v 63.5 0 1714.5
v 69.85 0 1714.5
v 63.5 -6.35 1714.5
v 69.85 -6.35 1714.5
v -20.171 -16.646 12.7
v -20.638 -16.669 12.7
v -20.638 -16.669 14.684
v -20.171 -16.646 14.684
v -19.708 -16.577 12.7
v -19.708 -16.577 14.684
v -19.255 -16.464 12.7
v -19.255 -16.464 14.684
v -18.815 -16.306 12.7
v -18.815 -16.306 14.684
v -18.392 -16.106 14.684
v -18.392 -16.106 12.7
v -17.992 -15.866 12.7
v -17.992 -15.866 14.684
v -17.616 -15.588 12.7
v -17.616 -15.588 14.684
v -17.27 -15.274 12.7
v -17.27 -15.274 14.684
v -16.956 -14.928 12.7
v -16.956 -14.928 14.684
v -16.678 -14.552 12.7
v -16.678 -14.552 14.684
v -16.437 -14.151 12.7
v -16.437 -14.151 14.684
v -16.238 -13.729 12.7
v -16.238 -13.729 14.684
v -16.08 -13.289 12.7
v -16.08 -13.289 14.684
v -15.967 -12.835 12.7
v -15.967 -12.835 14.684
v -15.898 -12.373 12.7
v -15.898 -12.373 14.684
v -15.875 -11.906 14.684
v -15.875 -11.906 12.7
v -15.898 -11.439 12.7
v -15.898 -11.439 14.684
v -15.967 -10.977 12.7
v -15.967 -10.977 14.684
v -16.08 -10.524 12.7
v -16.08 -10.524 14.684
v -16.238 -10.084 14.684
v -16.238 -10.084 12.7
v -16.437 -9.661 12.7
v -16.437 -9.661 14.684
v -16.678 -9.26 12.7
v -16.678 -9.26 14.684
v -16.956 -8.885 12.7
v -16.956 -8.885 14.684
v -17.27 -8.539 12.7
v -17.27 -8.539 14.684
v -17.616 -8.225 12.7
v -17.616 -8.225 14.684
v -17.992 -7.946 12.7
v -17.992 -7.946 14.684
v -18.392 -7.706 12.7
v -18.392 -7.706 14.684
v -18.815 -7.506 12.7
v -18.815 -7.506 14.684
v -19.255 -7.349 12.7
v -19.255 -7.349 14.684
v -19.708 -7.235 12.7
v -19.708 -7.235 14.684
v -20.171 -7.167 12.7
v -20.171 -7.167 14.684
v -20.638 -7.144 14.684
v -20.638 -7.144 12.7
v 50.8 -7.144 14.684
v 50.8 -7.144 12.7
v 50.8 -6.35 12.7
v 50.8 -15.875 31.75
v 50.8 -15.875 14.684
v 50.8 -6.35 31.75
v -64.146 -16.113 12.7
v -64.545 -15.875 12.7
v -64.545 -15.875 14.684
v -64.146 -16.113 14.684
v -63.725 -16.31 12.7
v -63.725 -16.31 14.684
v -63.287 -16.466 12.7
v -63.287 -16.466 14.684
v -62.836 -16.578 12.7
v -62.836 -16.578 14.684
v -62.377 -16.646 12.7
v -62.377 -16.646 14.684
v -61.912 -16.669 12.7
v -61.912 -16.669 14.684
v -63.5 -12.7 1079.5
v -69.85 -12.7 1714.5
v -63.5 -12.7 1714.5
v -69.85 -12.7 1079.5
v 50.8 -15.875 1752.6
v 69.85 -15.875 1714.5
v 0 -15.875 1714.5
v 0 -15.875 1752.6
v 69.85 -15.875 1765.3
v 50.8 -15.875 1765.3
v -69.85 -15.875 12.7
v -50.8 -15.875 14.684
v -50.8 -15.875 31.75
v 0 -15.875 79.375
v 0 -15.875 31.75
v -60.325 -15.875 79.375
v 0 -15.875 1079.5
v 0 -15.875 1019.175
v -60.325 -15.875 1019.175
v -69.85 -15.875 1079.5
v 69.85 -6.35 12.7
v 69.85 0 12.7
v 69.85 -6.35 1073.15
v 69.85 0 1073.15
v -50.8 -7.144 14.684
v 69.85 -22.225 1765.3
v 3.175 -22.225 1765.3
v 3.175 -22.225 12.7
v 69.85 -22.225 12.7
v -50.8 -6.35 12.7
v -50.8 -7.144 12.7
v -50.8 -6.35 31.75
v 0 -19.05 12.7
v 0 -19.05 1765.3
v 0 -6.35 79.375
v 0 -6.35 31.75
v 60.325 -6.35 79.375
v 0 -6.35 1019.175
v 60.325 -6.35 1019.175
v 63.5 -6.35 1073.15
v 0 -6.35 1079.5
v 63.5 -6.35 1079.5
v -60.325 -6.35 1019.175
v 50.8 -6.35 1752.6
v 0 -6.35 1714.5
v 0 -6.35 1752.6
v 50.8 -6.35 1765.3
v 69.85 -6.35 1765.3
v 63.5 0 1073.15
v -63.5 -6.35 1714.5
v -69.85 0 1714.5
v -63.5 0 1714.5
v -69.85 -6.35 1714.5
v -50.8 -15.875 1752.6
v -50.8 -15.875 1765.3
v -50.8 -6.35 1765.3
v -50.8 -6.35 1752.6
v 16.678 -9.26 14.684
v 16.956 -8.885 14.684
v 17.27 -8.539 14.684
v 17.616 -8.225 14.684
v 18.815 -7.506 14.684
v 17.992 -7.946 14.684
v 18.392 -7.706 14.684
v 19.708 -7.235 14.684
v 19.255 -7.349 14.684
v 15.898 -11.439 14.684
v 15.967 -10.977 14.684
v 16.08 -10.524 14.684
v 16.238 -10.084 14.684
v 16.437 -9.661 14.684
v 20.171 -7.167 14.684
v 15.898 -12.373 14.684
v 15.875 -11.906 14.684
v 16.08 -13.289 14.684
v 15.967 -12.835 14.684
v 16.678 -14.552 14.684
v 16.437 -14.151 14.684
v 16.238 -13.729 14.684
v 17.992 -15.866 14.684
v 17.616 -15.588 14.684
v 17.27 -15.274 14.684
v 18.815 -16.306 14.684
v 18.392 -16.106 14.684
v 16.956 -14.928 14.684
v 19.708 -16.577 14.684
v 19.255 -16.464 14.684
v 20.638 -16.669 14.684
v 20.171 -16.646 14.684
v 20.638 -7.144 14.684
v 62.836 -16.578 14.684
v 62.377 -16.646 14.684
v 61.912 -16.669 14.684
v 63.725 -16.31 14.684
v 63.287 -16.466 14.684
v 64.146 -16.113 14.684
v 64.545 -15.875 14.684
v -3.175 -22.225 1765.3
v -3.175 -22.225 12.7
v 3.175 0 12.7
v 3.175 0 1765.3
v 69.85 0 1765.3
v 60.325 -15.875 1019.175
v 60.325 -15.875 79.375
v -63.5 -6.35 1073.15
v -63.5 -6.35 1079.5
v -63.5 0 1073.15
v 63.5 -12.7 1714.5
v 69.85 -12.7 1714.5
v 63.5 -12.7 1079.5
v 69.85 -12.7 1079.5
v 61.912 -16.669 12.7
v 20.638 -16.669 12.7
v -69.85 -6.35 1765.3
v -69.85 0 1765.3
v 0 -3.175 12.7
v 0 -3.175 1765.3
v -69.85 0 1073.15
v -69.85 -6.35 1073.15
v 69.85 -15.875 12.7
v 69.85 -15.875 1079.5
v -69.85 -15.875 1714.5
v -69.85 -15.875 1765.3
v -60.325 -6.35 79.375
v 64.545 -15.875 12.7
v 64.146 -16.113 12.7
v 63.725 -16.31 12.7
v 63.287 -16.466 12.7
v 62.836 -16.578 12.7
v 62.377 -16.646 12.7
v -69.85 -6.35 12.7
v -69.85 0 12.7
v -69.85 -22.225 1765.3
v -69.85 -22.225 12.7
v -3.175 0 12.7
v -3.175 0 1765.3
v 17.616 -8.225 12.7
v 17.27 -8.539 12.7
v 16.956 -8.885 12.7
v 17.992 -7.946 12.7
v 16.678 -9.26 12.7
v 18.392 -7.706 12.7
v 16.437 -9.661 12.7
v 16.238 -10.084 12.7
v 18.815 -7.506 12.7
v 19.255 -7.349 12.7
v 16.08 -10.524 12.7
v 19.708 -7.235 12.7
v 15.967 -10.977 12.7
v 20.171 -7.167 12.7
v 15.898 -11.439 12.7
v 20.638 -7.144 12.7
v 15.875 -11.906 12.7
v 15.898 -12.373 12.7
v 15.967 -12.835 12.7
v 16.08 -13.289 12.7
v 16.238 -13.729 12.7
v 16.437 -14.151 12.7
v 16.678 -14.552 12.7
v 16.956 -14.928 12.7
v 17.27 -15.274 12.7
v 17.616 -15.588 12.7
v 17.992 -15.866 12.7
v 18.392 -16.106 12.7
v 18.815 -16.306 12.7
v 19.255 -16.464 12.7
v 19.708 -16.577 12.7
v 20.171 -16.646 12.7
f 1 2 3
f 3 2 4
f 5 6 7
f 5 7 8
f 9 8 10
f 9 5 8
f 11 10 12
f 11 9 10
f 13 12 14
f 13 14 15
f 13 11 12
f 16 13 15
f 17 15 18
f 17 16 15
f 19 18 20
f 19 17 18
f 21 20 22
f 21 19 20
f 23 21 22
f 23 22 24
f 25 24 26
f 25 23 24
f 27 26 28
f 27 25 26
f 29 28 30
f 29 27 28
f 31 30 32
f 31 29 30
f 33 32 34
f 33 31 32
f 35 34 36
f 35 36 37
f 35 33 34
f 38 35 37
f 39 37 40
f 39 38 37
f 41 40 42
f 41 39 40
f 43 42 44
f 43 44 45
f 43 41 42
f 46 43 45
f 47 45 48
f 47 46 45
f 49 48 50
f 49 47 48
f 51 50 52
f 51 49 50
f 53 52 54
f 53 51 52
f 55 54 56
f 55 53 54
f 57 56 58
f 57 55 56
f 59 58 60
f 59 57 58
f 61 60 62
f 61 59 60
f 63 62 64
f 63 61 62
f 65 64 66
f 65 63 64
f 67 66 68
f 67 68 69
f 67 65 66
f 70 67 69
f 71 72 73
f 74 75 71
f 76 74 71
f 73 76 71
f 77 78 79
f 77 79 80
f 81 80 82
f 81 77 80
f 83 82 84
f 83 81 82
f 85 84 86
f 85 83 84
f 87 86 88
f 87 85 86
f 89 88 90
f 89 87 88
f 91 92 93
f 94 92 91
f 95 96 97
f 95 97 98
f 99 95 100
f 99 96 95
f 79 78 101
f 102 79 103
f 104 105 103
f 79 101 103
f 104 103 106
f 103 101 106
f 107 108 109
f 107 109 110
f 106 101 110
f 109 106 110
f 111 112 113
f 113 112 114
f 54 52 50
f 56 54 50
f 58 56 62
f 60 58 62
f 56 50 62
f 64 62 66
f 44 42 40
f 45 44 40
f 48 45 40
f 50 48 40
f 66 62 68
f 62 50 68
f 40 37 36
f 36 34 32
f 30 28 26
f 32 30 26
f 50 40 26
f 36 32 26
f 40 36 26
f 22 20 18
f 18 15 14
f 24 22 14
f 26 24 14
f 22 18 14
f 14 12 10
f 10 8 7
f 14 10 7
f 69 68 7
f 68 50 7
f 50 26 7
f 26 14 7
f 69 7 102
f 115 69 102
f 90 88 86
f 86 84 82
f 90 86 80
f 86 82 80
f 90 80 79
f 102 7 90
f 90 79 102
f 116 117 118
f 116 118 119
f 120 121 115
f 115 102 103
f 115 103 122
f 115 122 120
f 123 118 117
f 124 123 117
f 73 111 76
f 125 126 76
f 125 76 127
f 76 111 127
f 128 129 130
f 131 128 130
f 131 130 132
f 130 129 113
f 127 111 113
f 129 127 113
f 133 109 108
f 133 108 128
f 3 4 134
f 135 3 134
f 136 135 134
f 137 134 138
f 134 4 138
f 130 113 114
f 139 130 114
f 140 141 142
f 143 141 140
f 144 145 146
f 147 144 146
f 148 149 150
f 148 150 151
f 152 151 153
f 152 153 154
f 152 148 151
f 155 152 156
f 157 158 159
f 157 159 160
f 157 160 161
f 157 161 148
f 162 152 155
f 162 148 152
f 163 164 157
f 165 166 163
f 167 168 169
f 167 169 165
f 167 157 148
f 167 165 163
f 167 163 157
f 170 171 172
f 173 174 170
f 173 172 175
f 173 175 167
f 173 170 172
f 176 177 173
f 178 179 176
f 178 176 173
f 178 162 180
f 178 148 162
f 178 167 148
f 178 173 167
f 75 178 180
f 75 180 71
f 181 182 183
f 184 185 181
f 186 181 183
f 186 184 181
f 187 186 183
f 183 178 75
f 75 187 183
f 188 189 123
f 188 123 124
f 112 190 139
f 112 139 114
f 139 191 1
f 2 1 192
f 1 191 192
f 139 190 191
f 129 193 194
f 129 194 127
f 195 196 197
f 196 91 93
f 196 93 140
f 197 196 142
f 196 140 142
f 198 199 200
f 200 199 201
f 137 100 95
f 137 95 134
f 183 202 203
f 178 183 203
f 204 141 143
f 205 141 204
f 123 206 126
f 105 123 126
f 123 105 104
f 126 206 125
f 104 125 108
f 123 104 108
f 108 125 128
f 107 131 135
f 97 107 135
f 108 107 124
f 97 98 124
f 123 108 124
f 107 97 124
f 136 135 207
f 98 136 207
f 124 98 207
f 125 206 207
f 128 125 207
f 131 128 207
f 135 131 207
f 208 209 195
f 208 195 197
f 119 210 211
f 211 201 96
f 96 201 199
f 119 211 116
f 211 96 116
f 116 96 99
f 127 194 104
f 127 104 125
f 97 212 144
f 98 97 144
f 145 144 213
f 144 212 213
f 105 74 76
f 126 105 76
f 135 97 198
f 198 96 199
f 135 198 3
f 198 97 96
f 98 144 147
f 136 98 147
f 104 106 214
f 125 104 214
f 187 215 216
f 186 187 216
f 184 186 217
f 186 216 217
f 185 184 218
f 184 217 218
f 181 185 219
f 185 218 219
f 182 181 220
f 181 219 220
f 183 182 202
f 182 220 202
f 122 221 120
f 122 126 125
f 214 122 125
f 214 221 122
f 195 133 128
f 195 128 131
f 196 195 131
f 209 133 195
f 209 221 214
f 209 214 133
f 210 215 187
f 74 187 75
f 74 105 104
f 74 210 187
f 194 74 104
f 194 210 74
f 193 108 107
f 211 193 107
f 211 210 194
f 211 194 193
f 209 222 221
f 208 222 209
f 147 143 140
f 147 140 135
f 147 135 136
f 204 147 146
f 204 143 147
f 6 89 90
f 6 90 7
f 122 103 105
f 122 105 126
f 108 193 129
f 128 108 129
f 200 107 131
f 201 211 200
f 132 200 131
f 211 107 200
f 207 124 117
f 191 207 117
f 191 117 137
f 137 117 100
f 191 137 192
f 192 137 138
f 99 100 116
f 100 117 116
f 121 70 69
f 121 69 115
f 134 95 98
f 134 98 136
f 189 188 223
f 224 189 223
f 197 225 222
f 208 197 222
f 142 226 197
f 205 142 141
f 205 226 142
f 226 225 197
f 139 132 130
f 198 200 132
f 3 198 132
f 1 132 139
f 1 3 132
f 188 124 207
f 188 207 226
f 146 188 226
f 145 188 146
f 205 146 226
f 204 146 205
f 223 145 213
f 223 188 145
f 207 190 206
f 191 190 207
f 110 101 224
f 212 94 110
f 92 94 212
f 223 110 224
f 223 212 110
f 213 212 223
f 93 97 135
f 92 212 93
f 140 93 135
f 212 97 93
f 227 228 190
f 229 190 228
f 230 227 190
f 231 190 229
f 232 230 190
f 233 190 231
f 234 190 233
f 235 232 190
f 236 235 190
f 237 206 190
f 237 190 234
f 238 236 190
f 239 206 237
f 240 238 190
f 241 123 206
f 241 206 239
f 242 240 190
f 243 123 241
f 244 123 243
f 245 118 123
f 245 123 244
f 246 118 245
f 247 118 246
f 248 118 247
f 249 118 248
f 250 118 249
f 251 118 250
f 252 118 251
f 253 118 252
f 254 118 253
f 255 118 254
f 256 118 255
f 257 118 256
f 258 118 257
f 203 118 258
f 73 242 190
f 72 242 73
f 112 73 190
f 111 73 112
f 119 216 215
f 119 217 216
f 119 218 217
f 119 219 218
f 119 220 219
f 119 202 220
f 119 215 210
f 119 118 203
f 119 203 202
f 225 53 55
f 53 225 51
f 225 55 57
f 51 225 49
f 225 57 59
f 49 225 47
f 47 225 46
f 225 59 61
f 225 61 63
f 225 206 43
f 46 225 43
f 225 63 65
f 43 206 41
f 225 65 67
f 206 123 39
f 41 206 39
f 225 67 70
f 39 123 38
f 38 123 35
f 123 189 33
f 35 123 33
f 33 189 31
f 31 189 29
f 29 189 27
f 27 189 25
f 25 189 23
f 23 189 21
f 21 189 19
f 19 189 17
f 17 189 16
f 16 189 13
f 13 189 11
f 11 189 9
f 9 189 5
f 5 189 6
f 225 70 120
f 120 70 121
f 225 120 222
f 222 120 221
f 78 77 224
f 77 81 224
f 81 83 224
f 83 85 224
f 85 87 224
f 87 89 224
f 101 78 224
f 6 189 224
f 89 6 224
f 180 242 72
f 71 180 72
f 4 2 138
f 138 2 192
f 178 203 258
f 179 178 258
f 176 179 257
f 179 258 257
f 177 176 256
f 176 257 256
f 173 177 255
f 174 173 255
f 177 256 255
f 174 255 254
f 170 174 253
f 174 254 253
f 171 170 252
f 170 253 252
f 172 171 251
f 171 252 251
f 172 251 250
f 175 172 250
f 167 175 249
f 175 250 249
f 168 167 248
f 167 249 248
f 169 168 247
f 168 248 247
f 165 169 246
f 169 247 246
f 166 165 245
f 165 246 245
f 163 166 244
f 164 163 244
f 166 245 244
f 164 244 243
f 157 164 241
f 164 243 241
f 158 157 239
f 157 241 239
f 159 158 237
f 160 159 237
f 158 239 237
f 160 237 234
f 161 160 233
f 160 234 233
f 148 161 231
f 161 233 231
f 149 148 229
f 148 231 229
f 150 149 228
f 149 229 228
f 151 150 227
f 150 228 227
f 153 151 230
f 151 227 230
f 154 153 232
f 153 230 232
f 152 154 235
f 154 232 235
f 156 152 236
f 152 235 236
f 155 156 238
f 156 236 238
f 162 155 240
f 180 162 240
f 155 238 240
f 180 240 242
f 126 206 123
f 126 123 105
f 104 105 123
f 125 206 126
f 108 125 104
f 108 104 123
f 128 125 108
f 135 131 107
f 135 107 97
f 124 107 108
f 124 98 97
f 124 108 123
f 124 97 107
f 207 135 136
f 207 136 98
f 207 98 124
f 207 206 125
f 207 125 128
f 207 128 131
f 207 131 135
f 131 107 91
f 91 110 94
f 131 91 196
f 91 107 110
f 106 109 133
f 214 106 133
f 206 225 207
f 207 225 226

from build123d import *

# Parameters (mm, degrees)
F0_W      = 69.85
F0_H      = 1778
F1_DEPTH  = 22.225
F2_W      = 9.525
F2_H      = 47.625
F2_H_2    = 38.1
F2_H_3    = 60.325
F3_DEPTH  = 69.85
F2_H_4    = 31.75
F2_H_5    = 25.4
F4_DEPTH  = 19.05
F5_W      = 69.85
F5_H      = 12.7
F6_DEPTH  = 22.226
F7_W      = 9.525
F7_H      = 939.8
F8_DEPTH  = 9.525
F10_SIZE  = 3.175
F11_DEPTH = 1.984375
F12_DEPTH = 6.35


with BuildPart() as f1:
    # F0 (on Front) → F1 (new body)
    with BuildSketch(Plane.XZ):
        with Locations((34.925, 889)):
            Rectangle(F0_W, F0_H)
    extrude(amount=F1_DEPTH)

    # F2 (on face) → F3 (cut, through all)
    with BuildSketch(Plane.YZ.offset(69.85)):
        with Locations((-11.1125, 55.5625)):
            Rectangle(F2_W, F2_H)
        with Locations((-11.1125, 1733.55)):
            Rectangle(F2_W, F2_H_2)
        with Locations((-11.1125, 1049.3375)):
            Rectangle(F2_W, F2_H_3)
    extrude(amount=-F3_DEPTH, mode=Mode.SUBTRACT)

    # F2 (on face) → F4 (cut)
    with BuildSketch(Plane.YZ.offset(69.85)):
        with Locations((-11.1125, 15.875)):
            Rectangle(F2_W, F2_H_4)
        with Locations((-11.1125, 1765.3)):
            Rectangle(F2_W, F2_H_5)
    extrude(amount=-F4_DEPTH, mode=Mode.SUBTRACT)

    # F5 (on face) → F6 (cut, through all)
    with BuildSketch(Plane.XZ.offset(22.225)):
        with Locations((34.925, 6.35)):
            Rectangle(F5_W, F5_H)
        with Locations((34.925, 1771.65)):
            Rectangle(F5_W, F5_H)
    extrude(amount=-F6_DEPTH, mode=Mode.SUBTRACT)

    # F7 (on face) → F8 (cut)
    with BuildSketch(Plane.YZ.offset(69.85)):
        with Locations((-11.1125, 549.275)):
            Rectangle(F7_W, F7_H)
    extrude(amount=-F8_DEPTH, mode=Mode.SUBTRACT)

    # F10
    f10_edges = [f1.edges().sort_by_distance(p)[0] for p in [
        (0, -22.225, 889),
        (0, 0, 889),
    ]]
    chamfer(f10_edges, length=F10_SIZE)

    # F9 (on face) → F11 (cut)
    with BuildSketch(Plane(origin=(0, 0, 12.7), x_dir=(1, 0, 0), z_dir=(0, 0, -1))):
        with BuildLine():
            Line((61.9125, 16.66875), (20.6375, 16.66875))
            ThreePointArc((20.6375, 16.66875), (15.875, 11.90625), (20.6375, 7.14375))
            Line((20.6375, 7.14375), (50.8, 7.14375))
            Line((50.8, 7.14375), (50.8, 15.875))
            Line((50.8, 15.875), (64.545071, 15.875))
            ThreePointArc((64.545071, 15.875), (63.287315, 16.465997), (61.9125, 16.66875))
        make_face()
    extrude(amount=-F11_DEPTH, mode=Mode.SUBTRACT)

    # F7 (on face) → F12 (cut)
    with BuildSketch(Plane.YZ.offset(69.85)):
        Polygon((-6.35, 1079.5), (-6.35, 1073.15), (0, 1073.15), (0, 1714.5), (-6.35, 1714.5), (-12.7, 1714.5), (-12.7, 1079.5), align=None)
    extrude(amount=-F12_DEPTH, mode=Mode.SUBTRACT)


with BuildPart() as f13_1:
    # F13: instance of F1
    add(f1.part.mirror(Plane(origin=(0, -11.1125, 888.222597), x_dir=(0, -1, 0), z_dir=(-1, 0, 0))))


solid = Compound([f1.part, f13_1.part])
